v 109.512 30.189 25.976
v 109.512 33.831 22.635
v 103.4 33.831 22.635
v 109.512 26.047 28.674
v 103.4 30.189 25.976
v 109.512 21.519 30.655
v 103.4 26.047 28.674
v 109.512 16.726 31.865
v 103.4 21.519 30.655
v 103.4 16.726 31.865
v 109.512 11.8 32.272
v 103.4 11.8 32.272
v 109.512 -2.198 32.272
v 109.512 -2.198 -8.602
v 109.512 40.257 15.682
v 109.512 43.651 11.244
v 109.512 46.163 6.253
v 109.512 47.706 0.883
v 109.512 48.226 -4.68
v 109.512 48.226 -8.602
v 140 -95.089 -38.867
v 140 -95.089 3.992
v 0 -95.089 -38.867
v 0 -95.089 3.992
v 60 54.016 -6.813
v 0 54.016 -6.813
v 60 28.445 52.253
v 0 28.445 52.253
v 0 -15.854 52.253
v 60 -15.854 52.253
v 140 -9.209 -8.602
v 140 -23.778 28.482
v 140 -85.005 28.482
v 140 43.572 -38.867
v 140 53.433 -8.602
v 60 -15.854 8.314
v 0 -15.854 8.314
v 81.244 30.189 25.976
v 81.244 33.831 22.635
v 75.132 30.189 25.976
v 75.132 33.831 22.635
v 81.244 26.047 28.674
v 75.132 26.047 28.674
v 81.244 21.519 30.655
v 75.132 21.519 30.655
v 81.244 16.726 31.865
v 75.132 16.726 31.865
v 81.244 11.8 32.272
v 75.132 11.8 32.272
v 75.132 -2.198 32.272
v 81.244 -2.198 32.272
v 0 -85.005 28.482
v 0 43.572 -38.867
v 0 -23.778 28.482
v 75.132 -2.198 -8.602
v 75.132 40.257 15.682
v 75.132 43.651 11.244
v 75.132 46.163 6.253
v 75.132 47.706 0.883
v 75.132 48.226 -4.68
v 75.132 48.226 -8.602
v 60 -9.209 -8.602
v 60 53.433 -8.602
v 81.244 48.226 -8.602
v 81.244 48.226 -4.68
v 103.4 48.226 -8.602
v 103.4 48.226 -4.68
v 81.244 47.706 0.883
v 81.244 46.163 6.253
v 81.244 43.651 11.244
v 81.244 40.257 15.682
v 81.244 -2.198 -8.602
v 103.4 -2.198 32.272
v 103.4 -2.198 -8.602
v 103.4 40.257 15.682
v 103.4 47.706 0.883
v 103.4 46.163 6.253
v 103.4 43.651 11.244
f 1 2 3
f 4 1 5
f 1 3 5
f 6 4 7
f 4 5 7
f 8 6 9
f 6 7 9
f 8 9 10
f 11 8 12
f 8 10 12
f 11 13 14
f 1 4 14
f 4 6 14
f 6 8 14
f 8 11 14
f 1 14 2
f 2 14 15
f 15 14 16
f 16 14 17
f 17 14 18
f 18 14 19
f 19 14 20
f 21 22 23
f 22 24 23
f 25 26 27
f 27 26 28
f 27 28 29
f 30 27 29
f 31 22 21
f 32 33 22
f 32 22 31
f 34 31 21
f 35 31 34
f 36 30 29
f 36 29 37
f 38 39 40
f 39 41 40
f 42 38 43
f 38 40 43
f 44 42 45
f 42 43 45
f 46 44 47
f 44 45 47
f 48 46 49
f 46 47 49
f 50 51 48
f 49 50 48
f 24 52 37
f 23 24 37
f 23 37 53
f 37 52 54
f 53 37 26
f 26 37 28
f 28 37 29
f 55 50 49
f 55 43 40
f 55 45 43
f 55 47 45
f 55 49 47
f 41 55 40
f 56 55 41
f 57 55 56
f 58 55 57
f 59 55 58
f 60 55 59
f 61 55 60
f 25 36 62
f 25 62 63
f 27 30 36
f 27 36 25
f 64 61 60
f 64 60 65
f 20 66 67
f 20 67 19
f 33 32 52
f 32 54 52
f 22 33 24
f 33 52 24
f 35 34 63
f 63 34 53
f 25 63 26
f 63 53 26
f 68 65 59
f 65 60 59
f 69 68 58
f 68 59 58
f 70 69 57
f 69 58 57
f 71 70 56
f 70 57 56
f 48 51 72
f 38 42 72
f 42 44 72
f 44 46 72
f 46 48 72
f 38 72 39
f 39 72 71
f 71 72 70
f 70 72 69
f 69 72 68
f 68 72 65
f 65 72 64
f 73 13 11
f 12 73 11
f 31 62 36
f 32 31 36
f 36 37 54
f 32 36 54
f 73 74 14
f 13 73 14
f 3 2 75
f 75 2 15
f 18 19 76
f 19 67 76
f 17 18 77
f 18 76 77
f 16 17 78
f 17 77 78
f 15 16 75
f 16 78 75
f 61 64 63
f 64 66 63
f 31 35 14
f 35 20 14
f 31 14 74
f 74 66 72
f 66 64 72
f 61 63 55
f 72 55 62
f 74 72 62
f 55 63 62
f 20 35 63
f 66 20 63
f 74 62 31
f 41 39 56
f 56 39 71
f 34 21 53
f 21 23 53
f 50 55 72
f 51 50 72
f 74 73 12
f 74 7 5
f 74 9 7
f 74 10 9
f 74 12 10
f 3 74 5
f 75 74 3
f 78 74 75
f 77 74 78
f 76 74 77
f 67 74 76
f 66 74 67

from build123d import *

# Parameters (mm, degrees)
F1_DEPTH = 60
F3_DEPTH = 80
F4_W     = 6.1120763421
F4_H     = 50.4245881457
F5_DEPTH = 57.3
F7_DEPTH = 45.7
F8_R     = 30


with BuildPart() as f1:
    # F0 (on Right) → F1 (new body)
    with BuildSketch(Plane.YZ):
        Polygon((-85.0046053529, 28.4824129194), (-95.0890108943, 3.9917188697), (-95.0890108943, -38.8669967651), (43.5715354979, -38.8669967651), (54.0160946548, -6.812999025), (28.4449271858, 52.252791822), (-15.8544126898, 52.252791822), (-15.8544126898, 8.3136055619), (-23.7778741866, 28.4824129194), align=None)
    extrude(amount=F1_DEPTH)

    # F2 (on face) → F3 (join)
    with BuildSketch(Plane.YZ.offset(60)):
        Polygon((-9.2091018375, -8.6017280287), (-15.8544126898, 8.3136055619), (-23.7778741866, 28.4824129194), (-85.0046053529, 28.4824129194), (-95.0890108943, 3.9917188697), (-95.0890108943, -38.8669967651), (43.5715354979, -38.8669967651), (53.433250479, -8.6017280287), align=None)
    extrude(amount=F3_DEPTH)

    # F4 (on face) → F5 (join)
    with BuildSketch(Plane.XY.offset(-8.6017280287)):
        with Locations((78.1879983842, 23.0138575425)):
            Rectangle(F4_W, F4_H)
        with Locations((106.4563281834, 23.0138575425)):
            Rectangle(F4_W, F4_H)
    extrude(amount=F5_DEPTH)

    # F6 (on face) → F7 (cut)
    with BuildSketch(Plane.YZ.offset(109.5123663545)):
        Polygon((-2.1984365303, 48.6982719713), (-2.1984365303, 32.272413373), (24.9238815159, 32.272413373), (48.2261516154, 7.0601203479), (48.2261516154, 48.6982719713), align=None)
    extrude(amount=-F7_DEPTH, mode=Mode.SUBTRACT)

    # F8
    f8_edges = [f1.edges().sort_by_distance(p)[0] for p in [
        (106.456328, 48.226152, 7.06012),
        (106.456328, 24.923882, 32.272413),
        (78.187998, 24.923882, 32.272413),
        (78.187998, 48.226152, 7.06012),
    ]]
    fillet(f8_edges, radius=F8_R)


solid = f1.part
